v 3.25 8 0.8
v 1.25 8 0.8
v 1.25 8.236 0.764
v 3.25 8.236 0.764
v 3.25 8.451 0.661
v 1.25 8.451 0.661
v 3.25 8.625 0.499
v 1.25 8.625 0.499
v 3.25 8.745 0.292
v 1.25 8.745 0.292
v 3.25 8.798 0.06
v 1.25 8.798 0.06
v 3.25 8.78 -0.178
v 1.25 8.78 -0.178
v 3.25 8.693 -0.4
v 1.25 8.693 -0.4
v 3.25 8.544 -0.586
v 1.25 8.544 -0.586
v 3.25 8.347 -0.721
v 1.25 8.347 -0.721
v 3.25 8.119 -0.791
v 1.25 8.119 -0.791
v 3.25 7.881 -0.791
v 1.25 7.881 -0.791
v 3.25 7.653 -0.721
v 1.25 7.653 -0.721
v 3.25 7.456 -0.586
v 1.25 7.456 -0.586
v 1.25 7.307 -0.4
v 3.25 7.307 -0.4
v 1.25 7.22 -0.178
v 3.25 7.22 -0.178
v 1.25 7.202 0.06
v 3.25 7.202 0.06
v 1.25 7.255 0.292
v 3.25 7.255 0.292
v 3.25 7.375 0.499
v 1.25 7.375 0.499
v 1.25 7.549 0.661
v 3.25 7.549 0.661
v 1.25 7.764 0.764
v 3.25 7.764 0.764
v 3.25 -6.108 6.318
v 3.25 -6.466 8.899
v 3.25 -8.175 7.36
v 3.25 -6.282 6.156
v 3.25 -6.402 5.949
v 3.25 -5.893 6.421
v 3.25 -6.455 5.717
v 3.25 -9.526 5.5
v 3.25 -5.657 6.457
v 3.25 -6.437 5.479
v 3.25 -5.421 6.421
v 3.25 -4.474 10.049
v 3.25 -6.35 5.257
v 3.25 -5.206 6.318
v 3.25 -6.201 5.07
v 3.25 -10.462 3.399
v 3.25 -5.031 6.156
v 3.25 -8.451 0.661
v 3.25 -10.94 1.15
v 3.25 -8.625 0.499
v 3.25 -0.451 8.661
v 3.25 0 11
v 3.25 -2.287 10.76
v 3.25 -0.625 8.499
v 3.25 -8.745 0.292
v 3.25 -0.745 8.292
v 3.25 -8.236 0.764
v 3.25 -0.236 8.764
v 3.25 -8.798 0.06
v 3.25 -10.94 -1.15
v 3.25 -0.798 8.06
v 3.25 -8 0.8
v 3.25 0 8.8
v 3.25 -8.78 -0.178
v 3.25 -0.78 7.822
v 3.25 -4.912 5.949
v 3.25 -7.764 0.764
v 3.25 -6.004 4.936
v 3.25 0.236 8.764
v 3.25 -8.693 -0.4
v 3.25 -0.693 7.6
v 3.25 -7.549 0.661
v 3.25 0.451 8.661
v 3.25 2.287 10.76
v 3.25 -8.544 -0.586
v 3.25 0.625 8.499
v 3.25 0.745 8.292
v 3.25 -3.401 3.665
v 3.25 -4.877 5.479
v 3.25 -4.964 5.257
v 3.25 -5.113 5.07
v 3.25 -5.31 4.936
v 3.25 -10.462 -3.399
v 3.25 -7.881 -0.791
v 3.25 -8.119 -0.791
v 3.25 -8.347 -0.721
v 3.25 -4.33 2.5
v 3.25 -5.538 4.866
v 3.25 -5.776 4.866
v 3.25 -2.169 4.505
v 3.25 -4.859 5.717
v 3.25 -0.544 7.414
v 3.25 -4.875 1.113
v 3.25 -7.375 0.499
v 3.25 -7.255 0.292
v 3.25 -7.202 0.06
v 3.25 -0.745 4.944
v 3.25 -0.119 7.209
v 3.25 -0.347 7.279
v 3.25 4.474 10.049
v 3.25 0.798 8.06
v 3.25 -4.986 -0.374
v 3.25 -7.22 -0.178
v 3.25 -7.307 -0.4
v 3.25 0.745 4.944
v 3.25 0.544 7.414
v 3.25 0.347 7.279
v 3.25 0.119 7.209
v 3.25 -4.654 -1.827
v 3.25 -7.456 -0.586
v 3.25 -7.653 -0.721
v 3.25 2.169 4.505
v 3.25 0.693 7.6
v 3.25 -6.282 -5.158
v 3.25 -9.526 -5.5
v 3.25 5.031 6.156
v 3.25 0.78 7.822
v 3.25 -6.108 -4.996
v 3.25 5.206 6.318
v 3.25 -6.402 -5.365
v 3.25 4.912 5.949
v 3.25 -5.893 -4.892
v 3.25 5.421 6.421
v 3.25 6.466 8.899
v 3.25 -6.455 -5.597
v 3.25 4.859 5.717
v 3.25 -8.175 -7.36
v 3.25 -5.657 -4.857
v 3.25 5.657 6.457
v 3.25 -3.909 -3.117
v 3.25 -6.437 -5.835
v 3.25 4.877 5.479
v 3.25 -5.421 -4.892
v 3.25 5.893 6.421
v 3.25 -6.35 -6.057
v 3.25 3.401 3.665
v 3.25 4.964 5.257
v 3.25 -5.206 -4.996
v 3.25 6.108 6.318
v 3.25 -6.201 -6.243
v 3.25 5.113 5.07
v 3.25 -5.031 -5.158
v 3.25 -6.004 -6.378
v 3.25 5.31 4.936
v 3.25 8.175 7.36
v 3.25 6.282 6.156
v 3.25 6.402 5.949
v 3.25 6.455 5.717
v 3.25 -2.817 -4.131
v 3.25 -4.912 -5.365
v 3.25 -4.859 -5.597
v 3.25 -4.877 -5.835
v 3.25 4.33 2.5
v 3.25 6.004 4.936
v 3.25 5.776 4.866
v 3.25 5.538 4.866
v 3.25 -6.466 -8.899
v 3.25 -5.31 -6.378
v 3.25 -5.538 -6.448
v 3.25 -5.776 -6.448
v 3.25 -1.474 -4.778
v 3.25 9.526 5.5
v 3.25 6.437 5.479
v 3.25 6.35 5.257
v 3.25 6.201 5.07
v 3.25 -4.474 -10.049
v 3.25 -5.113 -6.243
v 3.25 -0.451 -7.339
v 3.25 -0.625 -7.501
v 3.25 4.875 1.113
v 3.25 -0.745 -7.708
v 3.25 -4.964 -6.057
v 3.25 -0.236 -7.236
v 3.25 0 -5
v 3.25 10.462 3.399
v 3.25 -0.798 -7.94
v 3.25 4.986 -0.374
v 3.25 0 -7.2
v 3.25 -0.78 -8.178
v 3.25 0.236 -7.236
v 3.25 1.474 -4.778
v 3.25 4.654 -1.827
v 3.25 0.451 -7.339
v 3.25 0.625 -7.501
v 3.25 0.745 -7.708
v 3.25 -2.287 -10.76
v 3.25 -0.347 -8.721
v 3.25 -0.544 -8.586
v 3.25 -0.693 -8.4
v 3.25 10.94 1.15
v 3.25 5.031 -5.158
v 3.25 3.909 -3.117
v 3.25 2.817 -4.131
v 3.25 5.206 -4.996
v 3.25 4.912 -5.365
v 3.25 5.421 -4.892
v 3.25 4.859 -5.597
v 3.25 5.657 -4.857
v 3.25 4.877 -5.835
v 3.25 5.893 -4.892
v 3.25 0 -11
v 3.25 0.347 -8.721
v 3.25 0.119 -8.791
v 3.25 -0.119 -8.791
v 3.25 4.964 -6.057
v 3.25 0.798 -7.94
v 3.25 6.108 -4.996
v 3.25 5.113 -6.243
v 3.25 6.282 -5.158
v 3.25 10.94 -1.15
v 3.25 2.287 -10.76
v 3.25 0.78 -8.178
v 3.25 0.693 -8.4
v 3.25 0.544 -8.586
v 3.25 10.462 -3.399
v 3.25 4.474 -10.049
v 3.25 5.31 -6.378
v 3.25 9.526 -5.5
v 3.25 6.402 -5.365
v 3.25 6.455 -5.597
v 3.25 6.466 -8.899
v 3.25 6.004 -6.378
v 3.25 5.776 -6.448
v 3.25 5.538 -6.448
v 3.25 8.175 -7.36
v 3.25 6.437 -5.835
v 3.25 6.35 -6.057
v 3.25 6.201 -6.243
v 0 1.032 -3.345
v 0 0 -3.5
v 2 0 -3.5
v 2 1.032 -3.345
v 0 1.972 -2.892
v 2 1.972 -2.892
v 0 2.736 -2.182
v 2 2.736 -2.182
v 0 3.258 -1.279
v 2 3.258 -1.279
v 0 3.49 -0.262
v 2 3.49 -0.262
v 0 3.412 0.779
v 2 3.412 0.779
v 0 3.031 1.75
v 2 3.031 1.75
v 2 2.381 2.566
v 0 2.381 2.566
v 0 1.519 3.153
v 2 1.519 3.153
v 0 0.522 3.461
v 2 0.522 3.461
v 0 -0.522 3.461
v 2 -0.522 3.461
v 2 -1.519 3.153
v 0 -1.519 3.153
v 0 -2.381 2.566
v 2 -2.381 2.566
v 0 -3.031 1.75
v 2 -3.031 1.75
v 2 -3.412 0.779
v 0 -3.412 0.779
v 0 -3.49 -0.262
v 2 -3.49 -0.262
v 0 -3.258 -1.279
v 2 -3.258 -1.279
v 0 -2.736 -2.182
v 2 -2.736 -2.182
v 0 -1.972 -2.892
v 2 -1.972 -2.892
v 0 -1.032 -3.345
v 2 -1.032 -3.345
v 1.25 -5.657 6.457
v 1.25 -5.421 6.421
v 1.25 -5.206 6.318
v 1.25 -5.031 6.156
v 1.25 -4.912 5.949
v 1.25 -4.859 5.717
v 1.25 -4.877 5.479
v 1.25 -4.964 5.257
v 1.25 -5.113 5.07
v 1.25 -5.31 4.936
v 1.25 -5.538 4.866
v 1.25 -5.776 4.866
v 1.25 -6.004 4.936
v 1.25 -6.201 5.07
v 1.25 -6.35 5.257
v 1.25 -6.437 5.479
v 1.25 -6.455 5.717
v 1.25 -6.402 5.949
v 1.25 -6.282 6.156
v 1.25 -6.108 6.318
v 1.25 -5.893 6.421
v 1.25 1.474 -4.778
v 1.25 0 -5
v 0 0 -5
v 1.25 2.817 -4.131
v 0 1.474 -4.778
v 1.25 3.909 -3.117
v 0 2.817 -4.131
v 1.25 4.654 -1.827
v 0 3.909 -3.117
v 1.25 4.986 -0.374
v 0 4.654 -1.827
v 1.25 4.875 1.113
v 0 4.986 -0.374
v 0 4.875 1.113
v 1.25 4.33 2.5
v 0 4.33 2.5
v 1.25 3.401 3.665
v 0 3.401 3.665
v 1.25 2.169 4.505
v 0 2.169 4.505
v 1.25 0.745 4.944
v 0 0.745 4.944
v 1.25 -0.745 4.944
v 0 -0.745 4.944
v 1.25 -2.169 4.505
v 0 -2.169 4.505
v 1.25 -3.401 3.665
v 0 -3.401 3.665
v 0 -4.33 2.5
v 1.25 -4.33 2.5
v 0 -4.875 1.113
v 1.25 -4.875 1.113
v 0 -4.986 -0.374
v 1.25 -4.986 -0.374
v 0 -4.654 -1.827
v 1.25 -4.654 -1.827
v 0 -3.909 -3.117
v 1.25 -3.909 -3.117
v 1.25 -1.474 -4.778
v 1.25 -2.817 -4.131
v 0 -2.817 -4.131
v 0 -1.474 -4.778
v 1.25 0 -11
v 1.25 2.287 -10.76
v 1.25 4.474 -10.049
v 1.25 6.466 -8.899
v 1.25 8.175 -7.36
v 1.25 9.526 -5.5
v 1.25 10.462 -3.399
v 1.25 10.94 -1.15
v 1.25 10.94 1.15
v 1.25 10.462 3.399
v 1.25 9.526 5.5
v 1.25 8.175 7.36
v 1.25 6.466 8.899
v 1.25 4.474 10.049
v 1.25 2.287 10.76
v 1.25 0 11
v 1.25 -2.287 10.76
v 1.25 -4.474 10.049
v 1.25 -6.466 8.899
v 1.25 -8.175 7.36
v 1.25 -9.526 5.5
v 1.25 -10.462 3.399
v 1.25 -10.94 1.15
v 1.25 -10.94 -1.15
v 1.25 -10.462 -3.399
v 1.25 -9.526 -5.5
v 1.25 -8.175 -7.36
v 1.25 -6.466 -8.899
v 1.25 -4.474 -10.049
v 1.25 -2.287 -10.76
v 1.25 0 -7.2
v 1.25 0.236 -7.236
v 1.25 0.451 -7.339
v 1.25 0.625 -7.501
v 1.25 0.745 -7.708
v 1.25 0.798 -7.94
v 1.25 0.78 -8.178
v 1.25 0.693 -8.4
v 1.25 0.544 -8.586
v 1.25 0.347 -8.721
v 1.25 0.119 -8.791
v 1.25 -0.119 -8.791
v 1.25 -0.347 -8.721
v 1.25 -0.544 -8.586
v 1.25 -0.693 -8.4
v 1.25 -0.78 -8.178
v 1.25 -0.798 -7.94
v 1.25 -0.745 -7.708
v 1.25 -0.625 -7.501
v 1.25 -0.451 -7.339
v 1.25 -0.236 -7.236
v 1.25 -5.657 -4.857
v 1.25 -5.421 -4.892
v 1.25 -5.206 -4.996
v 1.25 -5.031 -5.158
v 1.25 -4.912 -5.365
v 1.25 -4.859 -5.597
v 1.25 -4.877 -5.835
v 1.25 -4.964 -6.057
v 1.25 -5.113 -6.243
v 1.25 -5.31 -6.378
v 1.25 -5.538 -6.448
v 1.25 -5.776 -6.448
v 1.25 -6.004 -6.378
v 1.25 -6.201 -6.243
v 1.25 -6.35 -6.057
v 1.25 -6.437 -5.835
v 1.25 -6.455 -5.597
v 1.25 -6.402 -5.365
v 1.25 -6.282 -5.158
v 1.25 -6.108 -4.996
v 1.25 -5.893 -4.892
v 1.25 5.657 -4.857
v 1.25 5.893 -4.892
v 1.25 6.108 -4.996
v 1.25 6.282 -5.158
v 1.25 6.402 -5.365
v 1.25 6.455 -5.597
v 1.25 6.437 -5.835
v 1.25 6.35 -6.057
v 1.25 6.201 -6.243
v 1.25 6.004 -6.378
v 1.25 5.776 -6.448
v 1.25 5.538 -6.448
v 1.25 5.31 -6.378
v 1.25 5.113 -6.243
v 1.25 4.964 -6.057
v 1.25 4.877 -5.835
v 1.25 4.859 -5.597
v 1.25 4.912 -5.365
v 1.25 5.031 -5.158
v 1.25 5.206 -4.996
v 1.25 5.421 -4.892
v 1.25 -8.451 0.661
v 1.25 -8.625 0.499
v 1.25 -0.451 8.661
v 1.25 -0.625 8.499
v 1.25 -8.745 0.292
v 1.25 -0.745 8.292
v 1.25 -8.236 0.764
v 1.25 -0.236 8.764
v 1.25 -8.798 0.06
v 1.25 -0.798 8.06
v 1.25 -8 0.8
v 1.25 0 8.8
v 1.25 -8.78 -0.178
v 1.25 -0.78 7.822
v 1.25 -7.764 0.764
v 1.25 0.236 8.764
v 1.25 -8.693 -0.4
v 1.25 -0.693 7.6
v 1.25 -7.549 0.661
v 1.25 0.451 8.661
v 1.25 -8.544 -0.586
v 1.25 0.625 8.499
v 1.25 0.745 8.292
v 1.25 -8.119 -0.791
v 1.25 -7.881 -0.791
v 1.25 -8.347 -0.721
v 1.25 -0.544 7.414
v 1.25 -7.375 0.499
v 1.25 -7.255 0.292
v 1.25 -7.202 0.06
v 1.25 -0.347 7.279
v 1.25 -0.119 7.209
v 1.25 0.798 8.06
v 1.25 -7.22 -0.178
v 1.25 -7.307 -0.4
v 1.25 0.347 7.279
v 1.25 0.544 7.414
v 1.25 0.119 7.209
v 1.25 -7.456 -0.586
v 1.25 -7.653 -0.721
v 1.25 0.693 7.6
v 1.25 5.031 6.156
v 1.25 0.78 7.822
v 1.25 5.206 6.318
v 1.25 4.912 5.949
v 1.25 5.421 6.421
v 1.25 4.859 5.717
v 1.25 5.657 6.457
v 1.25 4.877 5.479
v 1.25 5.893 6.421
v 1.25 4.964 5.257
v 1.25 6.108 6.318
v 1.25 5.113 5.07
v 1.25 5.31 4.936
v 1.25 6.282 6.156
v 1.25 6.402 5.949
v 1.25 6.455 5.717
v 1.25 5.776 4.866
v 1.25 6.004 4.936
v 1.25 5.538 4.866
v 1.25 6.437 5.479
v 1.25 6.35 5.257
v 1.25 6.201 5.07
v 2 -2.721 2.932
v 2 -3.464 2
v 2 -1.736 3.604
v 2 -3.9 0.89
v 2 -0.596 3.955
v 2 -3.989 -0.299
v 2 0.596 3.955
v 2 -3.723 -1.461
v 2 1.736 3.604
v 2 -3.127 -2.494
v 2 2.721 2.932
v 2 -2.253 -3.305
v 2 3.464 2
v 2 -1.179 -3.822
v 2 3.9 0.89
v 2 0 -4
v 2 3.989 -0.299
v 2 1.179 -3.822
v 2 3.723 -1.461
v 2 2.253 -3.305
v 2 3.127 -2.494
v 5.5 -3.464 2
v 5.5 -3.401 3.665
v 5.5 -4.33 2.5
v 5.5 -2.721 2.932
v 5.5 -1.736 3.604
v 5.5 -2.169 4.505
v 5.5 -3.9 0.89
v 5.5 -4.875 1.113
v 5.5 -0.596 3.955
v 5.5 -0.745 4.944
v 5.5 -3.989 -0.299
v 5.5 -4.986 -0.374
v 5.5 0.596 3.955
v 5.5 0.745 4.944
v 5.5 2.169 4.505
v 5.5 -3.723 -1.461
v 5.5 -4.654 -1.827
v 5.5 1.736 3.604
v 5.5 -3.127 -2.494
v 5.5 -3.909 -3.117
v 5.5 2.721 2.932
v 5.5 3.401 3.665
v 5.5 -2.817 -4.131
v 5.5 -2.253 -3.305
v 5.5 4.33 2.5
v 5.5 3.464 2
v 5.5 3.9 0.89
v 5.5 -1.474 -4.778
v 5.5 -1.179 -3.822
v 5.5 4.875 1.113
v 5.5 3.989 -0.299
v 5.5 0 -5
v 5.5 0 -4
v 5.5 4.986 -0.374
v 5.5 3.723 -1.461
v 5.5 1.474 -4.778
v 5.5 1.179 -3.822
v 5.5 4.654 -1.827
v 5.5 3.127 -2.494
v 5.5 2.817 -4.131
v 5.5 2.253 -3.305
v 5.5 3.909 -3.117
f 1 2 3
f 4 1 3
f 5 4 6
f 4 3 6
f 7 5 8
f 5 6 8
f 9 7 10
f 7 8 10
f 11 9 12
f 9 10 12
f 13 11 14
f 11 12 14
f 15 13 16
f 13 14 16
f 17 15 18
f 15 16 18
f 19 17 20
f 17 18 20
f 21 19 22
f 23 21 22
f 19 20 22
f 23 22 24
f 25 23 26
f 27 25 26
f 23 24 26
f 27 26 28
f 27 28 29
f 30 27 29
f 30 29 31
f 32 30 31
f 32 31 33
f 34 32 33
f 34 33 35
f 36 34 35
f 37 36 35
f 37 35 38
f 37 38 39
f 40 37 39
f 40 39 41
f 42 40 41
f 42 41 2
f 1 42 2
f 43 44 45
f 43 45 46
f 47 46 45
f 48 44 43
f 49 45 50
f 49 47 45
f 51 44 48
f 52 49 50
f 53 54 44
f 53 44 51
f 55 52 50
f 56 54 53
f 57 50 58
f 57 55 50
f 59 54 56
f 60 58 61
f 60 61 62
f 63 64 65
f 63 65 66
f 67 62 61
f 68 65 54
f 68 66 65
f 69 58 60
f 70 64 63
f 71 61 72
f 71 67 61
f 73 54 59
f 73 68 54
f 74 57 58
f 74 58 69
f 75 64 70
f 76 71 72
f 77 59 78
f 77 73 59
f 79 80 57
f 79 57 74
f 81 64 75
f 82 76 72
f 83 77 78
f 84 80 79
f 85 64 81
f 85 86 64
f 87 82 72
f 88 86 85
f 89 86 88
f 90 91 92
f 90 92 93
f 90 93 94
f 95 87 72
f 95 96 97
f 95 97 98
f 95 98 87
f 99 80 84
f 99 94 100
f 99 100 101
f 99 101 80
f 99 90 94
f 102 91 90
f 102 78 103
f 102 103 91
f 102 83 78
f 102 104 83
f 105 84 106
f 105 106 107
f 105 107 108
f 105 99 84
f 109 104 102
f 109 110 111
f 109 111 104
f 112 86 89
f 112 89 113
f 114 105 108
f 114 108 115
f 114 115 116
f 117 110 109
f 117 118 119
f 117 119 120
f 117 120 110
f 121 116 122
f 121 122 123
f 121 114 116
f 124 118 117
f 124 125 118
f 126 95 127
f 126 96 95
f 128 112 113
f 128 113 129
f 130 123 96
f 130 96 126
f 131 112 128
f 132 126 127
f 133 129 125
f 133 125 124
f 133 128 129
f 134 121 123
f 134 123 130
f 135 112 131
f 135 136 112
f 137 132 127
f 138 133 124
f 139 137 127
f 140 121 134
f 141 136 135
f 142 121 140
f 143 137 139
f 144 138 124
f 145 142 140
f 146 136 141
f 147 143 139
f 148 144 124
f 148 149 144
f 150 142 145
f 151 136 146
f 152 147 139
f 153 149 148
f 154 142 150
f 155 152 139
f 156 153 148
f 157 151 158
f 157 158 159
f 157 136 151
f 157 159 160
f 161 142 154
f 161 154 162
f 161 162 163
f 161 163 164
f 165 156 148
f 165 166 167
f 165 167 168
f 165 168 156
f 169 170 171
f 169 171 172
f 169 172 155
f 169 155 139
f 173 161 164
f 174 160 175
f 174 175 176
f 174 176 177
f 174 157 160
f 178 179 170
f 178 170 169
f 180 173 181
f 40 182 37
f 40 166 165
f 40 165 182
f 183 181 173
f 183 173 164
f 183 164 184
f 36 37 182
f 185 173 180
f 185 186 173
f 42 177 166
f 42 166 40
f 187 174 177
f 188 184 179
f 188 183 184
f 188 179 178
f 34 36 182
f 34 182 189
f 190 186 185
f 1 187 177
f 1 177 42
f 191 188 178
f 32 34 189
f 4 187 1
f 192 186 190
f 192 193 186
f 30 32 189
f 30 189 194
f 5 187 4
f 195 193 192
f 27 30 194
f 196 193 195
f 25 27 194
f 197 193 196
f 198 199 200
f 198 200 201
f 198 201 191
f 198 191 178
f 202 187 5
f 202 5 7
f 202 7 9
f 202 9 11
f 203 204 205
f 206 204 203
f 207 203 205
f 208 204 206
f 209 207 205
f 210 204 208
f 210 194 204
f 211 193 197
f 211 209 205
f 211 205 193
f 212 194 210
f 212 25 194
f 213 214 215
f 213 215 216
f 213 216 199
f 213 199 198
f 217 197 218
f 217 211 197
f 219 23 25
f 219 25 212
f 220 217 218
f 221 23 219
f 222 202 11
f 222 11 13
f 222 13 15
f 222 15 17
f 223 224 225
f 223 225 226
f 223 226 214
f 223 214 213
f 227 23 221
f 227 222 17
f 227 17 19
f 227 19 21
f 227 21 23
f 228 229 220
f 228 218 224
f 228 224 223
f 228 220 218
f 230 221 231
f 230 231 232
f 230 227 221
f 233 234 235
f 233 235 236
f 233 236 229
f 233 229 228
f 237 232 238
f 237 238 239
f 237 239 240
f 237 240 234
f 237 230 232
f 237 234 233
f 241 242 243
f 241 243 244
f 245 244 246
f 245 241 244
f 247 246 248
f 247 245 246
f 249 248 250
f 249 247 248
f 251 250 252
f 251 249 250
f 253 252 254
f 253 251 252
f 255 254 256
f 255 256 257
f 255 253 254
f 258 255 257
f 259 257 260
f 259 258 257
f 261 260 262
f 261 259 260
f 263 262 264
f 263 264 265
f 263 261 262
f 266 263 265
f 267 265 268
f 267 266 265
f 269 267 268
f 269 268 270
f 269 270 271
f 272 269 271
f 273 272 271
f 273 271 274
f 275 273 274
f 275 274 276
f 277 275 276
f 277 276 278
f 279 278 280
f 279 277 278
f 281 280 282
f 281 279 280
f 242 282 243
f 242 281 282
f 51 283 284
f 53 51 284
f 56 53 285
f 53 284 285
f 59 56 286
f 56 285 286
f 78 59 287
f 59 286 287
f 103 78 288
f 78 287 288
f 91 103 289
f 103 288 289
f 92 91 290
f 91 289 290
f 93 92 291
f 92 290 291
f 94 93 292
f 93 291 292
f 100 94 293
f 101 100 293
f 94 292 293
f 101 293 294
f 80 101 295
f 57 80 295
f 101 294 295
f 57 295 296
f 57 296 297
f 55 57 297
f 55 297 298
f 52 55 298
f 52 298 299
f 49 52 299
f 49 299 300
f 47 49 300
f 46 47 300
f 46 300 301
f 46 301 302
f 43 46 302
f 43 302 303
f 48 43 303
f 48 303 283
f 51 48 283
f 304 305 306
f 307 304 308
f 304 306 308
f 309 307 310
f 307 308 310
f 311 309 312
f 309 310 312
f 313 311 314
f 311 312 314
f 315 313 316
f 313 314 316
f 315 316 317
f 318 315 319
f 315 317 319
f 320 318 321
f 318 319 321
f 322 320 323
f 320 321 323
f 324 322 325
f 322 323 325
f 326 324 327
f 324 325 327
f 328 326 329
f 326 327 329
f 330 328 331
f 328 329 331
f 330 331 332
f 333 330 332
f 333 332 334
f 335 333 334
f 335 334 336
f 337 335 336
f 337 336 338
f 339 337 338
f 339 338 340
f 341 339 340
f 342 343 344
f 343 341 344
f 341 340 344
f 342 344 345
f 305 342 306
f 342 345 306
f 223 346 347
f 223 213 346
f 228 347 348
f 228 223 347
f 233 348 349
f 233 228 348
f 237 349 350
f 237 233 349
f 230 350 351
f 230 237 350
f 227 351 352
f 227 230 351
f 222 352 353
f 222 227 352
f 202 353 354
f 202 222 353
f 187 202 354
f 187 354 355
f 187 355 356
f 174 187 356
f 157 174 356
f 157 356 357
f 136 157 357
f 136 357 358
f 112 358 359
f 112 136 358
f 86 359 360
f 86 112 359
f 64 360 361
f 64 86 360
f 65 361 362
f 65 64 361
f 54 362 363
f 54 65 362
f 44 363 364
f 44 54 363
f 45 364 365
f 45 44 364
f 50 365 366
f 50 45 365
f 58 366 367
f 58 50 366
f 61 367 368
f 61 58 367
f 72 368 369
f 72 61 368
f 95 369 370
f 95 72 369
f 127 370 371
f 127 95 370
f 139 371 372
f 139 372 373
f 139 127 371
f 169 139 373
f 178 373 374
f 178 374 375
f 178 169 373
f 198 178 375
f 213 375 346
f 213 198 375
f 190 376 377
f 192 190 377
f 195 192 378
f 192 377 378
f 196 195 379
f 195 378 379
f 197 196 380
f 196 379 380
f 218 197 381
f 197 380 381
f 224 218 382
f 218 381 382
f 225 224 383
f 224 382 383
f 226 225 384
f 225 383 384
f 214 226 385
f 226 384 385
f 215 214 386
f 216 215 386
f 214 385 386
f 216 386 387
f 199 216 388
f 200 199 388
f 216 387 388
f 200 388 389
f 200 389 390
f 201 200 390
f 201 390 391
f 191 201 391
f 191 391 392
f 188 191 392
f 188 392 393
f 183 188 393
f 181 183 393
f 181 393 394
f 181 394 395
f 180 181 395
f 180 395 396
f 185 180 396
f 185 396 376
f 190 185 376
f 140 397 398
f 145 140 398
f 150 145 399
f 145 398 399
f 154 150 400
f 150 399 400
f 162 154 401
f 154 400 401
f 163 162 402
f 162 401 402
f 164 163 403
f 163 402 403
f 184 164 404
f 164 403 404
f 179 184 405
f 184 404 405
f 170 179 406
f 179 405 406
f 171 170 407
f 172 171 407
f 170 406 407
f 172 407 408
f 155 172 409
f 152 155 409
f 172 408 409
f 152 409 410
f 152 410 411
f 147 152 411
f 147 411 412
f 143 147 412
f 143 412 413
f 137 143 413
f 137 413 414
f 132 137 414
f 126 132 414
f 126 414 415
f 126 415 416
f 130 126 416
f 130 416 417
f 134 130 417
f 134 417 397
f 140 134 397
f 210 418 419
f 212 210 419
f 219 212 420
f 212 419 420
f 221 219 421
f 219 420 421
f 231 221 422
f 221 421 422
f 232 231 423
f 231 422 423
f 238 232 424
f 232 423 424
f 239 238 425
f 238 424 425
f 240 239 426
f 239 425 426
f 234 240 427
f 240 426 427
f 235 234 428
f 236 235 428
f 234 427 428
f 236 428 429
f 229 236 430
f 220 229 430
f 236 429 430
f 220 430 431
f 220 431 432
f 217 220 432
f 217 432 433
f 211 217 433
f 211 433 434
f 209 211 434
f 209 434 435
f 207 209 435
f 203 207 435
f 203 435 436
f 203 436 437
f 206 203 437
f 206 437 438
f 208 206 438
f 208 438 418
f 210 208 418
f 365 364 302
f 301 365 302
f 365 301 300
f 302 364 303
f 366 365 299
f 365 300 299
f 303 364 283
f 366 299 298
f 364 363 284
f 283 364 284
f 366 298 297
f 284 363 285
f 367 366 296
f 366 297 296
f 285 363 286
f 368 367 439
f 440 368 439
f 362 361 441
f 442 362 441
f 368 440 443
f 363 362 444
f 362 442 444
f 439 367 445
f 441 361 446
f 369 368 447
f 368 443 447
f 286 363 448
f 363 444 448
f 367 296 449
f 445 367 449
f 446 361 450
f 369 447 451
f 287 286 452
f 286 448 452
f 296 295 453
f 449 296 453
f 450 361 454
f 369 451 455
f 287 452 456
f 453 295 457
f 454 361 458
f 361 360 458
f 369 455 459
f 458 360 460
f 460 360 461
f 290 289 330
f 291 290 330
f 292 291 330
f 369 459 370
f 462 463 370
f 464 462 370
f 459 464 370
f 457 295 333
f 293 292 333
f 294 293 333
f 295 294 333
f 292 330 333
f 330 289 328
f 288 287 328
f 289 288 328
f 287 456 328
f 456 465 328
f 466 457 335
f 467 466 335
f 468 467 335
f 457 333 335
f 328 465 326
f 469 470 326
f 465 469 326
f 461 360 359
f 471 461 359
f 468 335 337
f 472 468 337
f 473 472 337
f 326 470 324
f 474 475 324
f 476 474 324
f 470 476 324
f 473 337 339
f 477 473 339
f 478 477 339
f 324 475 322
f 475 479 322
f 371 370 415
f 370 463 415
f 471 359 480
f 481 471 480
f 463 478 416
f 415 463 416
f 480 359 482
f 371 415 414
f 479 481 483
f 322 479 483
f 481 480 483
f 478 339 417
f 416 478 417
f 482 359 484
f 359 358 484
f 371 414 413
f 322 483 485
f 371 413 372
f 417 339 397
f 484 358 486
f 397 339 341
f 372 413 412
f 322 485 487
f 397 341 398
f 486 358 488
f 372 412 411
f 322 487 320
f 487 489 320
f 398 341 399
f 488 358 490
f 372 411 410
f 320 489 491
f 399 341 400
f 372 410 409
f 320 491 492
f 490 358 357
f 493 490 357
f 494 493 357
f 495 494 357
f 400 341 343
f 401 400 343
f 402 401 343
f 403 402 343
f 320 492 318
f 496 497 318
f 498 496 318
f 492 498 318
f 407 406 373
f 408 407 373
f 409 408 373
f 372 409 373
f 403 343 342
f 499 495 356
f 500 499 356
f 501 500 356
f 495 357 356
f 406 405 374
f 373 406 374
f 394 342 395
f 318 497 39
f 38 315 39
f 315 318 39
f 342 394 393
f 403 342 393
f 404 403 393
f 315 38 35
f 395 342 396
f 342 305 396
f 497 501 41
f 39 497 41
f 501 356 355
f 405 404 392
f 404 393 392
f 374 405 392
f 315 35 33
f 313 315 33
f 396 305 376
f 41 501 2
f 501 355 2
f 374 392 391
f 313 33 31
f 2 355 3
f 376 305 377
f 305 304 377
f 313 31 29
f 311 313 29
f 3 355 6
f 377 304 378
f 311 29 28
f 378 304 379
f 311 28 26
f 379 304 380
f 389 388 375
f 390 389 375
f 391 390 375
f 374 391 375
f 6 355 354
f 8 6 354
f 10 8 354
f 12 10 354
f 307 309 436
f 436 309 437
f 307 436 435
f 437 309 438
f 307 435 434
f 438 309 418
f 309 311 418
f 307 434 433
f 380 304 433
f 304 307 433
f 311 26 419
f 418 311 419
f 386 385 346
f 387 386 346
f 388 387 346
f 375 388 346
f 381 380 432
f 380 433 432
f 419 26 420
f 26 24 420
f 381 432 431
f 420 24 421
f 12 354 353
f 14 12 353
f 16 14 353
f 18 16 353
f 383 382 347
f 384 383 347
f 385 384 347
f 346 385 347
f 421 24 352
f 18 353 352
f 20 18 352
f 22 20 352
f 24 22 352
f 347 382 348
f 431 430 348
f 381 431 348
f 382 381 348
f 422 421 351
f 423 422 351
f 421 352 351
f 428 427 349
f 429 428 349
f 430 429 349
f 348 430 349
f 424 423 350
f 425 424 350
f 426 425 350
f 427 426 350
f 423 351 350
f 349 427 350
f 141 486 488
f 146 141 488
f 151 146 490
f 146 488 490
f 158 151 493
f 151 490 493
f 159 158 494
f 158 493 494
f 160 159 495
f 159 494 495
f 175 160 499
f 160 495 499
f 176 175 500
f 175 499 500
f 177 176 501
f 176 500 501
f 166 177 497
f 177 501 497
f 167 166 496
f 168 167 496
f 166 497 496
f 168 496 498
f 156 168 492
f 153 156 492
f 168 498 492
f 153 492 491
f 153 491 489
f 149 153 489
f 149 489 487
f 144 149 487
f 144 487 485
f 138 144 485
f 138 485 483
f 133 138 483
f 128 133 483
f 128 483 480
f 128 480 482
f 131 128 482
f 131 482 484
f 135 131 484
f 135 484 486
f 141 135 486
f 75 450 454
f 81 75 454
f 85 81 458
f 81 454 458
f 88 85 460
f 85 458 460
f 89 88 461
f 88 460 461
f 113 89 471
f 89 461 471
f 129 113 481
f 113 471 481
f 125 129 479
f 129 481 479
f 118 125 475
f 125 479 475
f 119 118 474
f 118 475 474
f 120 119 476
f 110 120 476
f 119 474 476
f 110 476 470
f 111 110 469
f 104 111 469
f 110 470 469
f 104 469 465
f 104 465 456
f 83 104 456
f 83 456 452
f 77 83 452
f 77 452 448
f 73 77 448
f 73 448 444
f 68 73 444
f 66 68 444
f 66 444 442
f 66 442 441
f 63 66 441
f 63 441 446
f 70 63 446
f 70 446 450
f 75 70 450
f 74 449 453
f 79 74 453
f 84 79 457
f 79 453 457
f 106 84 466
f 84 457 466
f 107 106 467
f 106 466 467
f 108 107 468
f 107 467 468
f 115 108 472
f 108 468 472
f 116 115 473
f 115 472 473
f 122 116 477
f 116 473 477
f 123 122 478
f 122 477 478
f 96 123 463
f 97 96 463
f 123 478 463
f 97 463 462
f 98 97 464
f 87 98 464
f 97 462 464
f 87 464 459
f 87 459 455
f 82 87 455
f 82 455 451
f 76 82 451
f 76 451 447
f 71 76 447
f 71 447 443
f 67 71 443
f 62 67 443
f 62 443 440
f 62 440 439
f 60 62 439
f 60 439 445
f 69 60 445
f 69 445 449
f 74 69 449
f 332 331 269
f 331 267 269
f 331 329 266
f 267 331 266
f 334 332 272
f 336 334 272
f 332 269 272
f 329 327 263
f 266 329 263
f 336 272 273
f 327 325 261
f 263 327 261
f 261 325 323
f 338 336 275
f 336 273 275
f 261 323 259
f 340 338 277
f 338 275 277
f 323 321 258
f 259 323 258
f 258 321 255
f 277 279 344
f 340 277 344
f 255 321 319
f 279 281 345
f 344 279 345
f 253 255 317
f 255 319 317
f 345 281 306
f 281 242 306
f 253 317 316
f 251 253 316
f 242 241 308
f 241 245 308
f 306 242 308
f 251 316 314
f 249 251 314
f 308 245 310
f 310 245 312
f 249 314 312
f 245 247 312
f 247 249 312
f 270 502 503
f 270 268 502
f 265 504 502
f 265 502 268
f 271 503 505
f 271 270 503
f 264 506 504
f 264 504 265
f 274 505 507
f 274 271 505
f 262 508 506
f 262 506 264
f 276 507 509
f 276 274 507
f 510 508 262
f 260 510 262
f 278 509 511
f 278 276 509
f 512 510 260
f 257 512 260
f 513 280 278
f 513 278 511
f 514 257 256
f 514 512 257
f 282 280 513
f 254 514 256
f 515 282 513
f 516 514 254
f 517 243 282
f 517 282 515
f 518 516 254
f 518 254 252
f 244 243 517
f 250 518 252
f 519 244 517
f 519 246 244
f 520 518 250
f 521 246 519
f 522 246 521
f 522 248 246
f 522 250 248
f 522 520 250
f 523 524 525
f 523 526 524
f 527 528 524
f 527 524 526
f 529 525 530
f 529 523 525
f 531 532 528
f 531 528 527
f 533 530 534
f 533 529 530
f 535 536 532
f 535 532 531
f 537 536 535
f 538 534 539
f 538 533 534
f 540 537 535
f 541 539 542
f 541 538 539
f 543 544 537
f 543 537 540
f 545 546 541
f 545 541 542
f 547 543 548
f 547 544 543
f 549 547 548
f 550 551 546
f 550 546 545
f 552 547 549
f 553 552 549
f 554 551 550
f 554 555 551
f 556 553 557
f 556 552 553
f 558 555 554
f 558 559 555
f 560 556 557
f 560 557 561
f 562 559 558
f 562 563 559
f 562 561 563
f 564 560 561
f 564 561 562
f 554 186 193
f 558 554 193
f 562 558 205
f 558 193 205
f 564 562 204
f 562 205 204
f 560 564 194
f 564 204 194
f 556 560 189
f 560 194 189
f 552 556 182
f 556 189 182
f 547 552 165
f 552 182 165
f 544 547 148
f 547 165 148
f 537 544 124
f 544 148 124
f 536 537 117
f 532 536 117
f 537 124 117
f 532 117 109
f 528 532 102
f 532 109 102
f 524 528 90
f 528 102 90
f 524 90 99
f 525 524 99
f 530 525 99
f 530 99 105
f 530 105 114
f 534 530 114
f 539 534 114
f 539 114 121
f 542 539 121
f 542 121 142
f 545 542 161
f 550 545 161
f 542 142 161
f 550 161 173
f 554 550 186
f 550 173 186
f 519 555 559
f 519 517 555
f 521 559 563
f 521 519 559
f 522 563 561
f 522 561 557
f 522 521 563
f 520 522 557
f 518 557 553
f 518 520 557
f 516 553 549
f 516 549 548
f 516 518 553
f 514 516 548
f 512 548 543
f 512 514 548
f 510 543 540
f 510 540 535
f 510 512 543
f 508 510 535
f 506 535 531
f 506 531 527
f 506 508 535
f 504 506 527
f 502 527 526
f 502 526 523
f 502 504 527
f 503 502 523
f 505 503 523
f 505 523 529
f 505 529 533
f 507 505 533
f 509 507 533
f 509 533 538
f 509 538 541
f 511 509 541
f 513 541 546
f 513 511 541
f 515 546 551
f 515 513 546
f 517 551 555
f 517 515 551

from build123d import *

# Parameters (mm, degrees)
SKETCH1_R                 = 5
SKETCH1_R_2               = 3.5
BOSS_EXTRUDE1_DEPTH       = 2
SKETCH2_R                 = 11
SKETCH2_R_2               = 4
BOSS_EXTRUDE2_DEPTH       = 1.25
BOSS_EXTRUDE3_START       = -0.75
SKETCH2_2_R               = 11
SKETCH2_2_R_2             = 4
BOSS_EXTRUDE3_DEPTH       = 0.75
SKETCH3_R                 = 5
SKETCH3_R_2               = 4
BOSS_EXTRUDE4_DEPTH       = 2.25
M2X0_4_TAPPED_HOLE1_D     = 1.6
M2X0_4_TAPPED_HOLE1_DEPTH = 5.2
M2X0_4_TAPPED_HOLE1_TIP   = 0.480688495


with BuildPart() as part:
    # Sketch1 → Boss-Extrude1 (new body)
    with BuildSketch(Plane(origin=(0, 0, 0), x_dir=(0, 0, -1), z_dir=(1, 0, 0))):
        Circle(SKETCH1_R)
        Circle(SKETCH1_R_2, mode=Mode.SUBTRACT)
    extrude(amount=BOSS_EXTRUDE1_DEPTH)

    # Sketch2 → Boss-Extrude2 (add)
    with BuildSketch(Plane(origin=(2, 0, 0), x_dir=(0, 0, -1), z_dir=(1, 0, 0))):
        Circle(SKETCH2_R)
        Circle(SKETCH2_R_2, mode=Mode.SUBTRACT)
    extrude(amount=BOSS_EXTRUDE2_DEPTH)

    # Sketch2<2> → Boss-Extrude3 (add)
    with BuildSketch(Plane(origin=(2, 0, 0), x_dir=(0, 0, -1), z_dir=(1, 0, 0)).offset(BOSS_EXTRUDE3_START)):
        Circle(SKETCH2_2_R)
        Circle(SKETCH2_2_R_2, mode=Mode.SUBTRACT)
    extrude(amount=BOSS_EXTRUDE3_DEPTH)

    # Sketch3 → Boss-Extrude4 (add)
    with BuildSketch(Plane(origin=(3.25, 0, 0), x_dir=(0, 0, -1), z_dir=(1, 0, 0))):
        Circle(SKETCH3_R)
        Circle(SKETCH3_R_2, mode=Mode.SUBTRACT)
    extrude(amount=BOSS_EXTRUDE4_DEPTH)

    # M2x0.4 Tapped Hole1
    with Locations(Plane(origin=(3.25, 0, 0), x_dir=(0, 0, -1), z_dir=(1, 0, 0))):
        with Locations((8, 0), (0, 8), (-5.656854249, 5.656854249), (5.656854249, 5.656854249), (5.656854249, -5.656854249), (0, -8), (-5.656854249, -5.656854249), (-8, 0)):
            Hole(M2X0_4_TAPPED_HOLE1_D / 2, depth=M2X0_4_TAPPED_HOLE1_DEPTH)
            with Locations((0, 0, -(M2X0_4_TAPPED_HOLE1_DEPTH + M2X0_4_TAPPED_HOLE1_TIP / 2))):  # 118° drill point
                Cone(0, M2X0_4_TAPPED_HOLE1_D / 2, M2X0_4_TAPPED_HOLE1_TIP, mode=Mode.SUBTRACT)


solid = part.part
